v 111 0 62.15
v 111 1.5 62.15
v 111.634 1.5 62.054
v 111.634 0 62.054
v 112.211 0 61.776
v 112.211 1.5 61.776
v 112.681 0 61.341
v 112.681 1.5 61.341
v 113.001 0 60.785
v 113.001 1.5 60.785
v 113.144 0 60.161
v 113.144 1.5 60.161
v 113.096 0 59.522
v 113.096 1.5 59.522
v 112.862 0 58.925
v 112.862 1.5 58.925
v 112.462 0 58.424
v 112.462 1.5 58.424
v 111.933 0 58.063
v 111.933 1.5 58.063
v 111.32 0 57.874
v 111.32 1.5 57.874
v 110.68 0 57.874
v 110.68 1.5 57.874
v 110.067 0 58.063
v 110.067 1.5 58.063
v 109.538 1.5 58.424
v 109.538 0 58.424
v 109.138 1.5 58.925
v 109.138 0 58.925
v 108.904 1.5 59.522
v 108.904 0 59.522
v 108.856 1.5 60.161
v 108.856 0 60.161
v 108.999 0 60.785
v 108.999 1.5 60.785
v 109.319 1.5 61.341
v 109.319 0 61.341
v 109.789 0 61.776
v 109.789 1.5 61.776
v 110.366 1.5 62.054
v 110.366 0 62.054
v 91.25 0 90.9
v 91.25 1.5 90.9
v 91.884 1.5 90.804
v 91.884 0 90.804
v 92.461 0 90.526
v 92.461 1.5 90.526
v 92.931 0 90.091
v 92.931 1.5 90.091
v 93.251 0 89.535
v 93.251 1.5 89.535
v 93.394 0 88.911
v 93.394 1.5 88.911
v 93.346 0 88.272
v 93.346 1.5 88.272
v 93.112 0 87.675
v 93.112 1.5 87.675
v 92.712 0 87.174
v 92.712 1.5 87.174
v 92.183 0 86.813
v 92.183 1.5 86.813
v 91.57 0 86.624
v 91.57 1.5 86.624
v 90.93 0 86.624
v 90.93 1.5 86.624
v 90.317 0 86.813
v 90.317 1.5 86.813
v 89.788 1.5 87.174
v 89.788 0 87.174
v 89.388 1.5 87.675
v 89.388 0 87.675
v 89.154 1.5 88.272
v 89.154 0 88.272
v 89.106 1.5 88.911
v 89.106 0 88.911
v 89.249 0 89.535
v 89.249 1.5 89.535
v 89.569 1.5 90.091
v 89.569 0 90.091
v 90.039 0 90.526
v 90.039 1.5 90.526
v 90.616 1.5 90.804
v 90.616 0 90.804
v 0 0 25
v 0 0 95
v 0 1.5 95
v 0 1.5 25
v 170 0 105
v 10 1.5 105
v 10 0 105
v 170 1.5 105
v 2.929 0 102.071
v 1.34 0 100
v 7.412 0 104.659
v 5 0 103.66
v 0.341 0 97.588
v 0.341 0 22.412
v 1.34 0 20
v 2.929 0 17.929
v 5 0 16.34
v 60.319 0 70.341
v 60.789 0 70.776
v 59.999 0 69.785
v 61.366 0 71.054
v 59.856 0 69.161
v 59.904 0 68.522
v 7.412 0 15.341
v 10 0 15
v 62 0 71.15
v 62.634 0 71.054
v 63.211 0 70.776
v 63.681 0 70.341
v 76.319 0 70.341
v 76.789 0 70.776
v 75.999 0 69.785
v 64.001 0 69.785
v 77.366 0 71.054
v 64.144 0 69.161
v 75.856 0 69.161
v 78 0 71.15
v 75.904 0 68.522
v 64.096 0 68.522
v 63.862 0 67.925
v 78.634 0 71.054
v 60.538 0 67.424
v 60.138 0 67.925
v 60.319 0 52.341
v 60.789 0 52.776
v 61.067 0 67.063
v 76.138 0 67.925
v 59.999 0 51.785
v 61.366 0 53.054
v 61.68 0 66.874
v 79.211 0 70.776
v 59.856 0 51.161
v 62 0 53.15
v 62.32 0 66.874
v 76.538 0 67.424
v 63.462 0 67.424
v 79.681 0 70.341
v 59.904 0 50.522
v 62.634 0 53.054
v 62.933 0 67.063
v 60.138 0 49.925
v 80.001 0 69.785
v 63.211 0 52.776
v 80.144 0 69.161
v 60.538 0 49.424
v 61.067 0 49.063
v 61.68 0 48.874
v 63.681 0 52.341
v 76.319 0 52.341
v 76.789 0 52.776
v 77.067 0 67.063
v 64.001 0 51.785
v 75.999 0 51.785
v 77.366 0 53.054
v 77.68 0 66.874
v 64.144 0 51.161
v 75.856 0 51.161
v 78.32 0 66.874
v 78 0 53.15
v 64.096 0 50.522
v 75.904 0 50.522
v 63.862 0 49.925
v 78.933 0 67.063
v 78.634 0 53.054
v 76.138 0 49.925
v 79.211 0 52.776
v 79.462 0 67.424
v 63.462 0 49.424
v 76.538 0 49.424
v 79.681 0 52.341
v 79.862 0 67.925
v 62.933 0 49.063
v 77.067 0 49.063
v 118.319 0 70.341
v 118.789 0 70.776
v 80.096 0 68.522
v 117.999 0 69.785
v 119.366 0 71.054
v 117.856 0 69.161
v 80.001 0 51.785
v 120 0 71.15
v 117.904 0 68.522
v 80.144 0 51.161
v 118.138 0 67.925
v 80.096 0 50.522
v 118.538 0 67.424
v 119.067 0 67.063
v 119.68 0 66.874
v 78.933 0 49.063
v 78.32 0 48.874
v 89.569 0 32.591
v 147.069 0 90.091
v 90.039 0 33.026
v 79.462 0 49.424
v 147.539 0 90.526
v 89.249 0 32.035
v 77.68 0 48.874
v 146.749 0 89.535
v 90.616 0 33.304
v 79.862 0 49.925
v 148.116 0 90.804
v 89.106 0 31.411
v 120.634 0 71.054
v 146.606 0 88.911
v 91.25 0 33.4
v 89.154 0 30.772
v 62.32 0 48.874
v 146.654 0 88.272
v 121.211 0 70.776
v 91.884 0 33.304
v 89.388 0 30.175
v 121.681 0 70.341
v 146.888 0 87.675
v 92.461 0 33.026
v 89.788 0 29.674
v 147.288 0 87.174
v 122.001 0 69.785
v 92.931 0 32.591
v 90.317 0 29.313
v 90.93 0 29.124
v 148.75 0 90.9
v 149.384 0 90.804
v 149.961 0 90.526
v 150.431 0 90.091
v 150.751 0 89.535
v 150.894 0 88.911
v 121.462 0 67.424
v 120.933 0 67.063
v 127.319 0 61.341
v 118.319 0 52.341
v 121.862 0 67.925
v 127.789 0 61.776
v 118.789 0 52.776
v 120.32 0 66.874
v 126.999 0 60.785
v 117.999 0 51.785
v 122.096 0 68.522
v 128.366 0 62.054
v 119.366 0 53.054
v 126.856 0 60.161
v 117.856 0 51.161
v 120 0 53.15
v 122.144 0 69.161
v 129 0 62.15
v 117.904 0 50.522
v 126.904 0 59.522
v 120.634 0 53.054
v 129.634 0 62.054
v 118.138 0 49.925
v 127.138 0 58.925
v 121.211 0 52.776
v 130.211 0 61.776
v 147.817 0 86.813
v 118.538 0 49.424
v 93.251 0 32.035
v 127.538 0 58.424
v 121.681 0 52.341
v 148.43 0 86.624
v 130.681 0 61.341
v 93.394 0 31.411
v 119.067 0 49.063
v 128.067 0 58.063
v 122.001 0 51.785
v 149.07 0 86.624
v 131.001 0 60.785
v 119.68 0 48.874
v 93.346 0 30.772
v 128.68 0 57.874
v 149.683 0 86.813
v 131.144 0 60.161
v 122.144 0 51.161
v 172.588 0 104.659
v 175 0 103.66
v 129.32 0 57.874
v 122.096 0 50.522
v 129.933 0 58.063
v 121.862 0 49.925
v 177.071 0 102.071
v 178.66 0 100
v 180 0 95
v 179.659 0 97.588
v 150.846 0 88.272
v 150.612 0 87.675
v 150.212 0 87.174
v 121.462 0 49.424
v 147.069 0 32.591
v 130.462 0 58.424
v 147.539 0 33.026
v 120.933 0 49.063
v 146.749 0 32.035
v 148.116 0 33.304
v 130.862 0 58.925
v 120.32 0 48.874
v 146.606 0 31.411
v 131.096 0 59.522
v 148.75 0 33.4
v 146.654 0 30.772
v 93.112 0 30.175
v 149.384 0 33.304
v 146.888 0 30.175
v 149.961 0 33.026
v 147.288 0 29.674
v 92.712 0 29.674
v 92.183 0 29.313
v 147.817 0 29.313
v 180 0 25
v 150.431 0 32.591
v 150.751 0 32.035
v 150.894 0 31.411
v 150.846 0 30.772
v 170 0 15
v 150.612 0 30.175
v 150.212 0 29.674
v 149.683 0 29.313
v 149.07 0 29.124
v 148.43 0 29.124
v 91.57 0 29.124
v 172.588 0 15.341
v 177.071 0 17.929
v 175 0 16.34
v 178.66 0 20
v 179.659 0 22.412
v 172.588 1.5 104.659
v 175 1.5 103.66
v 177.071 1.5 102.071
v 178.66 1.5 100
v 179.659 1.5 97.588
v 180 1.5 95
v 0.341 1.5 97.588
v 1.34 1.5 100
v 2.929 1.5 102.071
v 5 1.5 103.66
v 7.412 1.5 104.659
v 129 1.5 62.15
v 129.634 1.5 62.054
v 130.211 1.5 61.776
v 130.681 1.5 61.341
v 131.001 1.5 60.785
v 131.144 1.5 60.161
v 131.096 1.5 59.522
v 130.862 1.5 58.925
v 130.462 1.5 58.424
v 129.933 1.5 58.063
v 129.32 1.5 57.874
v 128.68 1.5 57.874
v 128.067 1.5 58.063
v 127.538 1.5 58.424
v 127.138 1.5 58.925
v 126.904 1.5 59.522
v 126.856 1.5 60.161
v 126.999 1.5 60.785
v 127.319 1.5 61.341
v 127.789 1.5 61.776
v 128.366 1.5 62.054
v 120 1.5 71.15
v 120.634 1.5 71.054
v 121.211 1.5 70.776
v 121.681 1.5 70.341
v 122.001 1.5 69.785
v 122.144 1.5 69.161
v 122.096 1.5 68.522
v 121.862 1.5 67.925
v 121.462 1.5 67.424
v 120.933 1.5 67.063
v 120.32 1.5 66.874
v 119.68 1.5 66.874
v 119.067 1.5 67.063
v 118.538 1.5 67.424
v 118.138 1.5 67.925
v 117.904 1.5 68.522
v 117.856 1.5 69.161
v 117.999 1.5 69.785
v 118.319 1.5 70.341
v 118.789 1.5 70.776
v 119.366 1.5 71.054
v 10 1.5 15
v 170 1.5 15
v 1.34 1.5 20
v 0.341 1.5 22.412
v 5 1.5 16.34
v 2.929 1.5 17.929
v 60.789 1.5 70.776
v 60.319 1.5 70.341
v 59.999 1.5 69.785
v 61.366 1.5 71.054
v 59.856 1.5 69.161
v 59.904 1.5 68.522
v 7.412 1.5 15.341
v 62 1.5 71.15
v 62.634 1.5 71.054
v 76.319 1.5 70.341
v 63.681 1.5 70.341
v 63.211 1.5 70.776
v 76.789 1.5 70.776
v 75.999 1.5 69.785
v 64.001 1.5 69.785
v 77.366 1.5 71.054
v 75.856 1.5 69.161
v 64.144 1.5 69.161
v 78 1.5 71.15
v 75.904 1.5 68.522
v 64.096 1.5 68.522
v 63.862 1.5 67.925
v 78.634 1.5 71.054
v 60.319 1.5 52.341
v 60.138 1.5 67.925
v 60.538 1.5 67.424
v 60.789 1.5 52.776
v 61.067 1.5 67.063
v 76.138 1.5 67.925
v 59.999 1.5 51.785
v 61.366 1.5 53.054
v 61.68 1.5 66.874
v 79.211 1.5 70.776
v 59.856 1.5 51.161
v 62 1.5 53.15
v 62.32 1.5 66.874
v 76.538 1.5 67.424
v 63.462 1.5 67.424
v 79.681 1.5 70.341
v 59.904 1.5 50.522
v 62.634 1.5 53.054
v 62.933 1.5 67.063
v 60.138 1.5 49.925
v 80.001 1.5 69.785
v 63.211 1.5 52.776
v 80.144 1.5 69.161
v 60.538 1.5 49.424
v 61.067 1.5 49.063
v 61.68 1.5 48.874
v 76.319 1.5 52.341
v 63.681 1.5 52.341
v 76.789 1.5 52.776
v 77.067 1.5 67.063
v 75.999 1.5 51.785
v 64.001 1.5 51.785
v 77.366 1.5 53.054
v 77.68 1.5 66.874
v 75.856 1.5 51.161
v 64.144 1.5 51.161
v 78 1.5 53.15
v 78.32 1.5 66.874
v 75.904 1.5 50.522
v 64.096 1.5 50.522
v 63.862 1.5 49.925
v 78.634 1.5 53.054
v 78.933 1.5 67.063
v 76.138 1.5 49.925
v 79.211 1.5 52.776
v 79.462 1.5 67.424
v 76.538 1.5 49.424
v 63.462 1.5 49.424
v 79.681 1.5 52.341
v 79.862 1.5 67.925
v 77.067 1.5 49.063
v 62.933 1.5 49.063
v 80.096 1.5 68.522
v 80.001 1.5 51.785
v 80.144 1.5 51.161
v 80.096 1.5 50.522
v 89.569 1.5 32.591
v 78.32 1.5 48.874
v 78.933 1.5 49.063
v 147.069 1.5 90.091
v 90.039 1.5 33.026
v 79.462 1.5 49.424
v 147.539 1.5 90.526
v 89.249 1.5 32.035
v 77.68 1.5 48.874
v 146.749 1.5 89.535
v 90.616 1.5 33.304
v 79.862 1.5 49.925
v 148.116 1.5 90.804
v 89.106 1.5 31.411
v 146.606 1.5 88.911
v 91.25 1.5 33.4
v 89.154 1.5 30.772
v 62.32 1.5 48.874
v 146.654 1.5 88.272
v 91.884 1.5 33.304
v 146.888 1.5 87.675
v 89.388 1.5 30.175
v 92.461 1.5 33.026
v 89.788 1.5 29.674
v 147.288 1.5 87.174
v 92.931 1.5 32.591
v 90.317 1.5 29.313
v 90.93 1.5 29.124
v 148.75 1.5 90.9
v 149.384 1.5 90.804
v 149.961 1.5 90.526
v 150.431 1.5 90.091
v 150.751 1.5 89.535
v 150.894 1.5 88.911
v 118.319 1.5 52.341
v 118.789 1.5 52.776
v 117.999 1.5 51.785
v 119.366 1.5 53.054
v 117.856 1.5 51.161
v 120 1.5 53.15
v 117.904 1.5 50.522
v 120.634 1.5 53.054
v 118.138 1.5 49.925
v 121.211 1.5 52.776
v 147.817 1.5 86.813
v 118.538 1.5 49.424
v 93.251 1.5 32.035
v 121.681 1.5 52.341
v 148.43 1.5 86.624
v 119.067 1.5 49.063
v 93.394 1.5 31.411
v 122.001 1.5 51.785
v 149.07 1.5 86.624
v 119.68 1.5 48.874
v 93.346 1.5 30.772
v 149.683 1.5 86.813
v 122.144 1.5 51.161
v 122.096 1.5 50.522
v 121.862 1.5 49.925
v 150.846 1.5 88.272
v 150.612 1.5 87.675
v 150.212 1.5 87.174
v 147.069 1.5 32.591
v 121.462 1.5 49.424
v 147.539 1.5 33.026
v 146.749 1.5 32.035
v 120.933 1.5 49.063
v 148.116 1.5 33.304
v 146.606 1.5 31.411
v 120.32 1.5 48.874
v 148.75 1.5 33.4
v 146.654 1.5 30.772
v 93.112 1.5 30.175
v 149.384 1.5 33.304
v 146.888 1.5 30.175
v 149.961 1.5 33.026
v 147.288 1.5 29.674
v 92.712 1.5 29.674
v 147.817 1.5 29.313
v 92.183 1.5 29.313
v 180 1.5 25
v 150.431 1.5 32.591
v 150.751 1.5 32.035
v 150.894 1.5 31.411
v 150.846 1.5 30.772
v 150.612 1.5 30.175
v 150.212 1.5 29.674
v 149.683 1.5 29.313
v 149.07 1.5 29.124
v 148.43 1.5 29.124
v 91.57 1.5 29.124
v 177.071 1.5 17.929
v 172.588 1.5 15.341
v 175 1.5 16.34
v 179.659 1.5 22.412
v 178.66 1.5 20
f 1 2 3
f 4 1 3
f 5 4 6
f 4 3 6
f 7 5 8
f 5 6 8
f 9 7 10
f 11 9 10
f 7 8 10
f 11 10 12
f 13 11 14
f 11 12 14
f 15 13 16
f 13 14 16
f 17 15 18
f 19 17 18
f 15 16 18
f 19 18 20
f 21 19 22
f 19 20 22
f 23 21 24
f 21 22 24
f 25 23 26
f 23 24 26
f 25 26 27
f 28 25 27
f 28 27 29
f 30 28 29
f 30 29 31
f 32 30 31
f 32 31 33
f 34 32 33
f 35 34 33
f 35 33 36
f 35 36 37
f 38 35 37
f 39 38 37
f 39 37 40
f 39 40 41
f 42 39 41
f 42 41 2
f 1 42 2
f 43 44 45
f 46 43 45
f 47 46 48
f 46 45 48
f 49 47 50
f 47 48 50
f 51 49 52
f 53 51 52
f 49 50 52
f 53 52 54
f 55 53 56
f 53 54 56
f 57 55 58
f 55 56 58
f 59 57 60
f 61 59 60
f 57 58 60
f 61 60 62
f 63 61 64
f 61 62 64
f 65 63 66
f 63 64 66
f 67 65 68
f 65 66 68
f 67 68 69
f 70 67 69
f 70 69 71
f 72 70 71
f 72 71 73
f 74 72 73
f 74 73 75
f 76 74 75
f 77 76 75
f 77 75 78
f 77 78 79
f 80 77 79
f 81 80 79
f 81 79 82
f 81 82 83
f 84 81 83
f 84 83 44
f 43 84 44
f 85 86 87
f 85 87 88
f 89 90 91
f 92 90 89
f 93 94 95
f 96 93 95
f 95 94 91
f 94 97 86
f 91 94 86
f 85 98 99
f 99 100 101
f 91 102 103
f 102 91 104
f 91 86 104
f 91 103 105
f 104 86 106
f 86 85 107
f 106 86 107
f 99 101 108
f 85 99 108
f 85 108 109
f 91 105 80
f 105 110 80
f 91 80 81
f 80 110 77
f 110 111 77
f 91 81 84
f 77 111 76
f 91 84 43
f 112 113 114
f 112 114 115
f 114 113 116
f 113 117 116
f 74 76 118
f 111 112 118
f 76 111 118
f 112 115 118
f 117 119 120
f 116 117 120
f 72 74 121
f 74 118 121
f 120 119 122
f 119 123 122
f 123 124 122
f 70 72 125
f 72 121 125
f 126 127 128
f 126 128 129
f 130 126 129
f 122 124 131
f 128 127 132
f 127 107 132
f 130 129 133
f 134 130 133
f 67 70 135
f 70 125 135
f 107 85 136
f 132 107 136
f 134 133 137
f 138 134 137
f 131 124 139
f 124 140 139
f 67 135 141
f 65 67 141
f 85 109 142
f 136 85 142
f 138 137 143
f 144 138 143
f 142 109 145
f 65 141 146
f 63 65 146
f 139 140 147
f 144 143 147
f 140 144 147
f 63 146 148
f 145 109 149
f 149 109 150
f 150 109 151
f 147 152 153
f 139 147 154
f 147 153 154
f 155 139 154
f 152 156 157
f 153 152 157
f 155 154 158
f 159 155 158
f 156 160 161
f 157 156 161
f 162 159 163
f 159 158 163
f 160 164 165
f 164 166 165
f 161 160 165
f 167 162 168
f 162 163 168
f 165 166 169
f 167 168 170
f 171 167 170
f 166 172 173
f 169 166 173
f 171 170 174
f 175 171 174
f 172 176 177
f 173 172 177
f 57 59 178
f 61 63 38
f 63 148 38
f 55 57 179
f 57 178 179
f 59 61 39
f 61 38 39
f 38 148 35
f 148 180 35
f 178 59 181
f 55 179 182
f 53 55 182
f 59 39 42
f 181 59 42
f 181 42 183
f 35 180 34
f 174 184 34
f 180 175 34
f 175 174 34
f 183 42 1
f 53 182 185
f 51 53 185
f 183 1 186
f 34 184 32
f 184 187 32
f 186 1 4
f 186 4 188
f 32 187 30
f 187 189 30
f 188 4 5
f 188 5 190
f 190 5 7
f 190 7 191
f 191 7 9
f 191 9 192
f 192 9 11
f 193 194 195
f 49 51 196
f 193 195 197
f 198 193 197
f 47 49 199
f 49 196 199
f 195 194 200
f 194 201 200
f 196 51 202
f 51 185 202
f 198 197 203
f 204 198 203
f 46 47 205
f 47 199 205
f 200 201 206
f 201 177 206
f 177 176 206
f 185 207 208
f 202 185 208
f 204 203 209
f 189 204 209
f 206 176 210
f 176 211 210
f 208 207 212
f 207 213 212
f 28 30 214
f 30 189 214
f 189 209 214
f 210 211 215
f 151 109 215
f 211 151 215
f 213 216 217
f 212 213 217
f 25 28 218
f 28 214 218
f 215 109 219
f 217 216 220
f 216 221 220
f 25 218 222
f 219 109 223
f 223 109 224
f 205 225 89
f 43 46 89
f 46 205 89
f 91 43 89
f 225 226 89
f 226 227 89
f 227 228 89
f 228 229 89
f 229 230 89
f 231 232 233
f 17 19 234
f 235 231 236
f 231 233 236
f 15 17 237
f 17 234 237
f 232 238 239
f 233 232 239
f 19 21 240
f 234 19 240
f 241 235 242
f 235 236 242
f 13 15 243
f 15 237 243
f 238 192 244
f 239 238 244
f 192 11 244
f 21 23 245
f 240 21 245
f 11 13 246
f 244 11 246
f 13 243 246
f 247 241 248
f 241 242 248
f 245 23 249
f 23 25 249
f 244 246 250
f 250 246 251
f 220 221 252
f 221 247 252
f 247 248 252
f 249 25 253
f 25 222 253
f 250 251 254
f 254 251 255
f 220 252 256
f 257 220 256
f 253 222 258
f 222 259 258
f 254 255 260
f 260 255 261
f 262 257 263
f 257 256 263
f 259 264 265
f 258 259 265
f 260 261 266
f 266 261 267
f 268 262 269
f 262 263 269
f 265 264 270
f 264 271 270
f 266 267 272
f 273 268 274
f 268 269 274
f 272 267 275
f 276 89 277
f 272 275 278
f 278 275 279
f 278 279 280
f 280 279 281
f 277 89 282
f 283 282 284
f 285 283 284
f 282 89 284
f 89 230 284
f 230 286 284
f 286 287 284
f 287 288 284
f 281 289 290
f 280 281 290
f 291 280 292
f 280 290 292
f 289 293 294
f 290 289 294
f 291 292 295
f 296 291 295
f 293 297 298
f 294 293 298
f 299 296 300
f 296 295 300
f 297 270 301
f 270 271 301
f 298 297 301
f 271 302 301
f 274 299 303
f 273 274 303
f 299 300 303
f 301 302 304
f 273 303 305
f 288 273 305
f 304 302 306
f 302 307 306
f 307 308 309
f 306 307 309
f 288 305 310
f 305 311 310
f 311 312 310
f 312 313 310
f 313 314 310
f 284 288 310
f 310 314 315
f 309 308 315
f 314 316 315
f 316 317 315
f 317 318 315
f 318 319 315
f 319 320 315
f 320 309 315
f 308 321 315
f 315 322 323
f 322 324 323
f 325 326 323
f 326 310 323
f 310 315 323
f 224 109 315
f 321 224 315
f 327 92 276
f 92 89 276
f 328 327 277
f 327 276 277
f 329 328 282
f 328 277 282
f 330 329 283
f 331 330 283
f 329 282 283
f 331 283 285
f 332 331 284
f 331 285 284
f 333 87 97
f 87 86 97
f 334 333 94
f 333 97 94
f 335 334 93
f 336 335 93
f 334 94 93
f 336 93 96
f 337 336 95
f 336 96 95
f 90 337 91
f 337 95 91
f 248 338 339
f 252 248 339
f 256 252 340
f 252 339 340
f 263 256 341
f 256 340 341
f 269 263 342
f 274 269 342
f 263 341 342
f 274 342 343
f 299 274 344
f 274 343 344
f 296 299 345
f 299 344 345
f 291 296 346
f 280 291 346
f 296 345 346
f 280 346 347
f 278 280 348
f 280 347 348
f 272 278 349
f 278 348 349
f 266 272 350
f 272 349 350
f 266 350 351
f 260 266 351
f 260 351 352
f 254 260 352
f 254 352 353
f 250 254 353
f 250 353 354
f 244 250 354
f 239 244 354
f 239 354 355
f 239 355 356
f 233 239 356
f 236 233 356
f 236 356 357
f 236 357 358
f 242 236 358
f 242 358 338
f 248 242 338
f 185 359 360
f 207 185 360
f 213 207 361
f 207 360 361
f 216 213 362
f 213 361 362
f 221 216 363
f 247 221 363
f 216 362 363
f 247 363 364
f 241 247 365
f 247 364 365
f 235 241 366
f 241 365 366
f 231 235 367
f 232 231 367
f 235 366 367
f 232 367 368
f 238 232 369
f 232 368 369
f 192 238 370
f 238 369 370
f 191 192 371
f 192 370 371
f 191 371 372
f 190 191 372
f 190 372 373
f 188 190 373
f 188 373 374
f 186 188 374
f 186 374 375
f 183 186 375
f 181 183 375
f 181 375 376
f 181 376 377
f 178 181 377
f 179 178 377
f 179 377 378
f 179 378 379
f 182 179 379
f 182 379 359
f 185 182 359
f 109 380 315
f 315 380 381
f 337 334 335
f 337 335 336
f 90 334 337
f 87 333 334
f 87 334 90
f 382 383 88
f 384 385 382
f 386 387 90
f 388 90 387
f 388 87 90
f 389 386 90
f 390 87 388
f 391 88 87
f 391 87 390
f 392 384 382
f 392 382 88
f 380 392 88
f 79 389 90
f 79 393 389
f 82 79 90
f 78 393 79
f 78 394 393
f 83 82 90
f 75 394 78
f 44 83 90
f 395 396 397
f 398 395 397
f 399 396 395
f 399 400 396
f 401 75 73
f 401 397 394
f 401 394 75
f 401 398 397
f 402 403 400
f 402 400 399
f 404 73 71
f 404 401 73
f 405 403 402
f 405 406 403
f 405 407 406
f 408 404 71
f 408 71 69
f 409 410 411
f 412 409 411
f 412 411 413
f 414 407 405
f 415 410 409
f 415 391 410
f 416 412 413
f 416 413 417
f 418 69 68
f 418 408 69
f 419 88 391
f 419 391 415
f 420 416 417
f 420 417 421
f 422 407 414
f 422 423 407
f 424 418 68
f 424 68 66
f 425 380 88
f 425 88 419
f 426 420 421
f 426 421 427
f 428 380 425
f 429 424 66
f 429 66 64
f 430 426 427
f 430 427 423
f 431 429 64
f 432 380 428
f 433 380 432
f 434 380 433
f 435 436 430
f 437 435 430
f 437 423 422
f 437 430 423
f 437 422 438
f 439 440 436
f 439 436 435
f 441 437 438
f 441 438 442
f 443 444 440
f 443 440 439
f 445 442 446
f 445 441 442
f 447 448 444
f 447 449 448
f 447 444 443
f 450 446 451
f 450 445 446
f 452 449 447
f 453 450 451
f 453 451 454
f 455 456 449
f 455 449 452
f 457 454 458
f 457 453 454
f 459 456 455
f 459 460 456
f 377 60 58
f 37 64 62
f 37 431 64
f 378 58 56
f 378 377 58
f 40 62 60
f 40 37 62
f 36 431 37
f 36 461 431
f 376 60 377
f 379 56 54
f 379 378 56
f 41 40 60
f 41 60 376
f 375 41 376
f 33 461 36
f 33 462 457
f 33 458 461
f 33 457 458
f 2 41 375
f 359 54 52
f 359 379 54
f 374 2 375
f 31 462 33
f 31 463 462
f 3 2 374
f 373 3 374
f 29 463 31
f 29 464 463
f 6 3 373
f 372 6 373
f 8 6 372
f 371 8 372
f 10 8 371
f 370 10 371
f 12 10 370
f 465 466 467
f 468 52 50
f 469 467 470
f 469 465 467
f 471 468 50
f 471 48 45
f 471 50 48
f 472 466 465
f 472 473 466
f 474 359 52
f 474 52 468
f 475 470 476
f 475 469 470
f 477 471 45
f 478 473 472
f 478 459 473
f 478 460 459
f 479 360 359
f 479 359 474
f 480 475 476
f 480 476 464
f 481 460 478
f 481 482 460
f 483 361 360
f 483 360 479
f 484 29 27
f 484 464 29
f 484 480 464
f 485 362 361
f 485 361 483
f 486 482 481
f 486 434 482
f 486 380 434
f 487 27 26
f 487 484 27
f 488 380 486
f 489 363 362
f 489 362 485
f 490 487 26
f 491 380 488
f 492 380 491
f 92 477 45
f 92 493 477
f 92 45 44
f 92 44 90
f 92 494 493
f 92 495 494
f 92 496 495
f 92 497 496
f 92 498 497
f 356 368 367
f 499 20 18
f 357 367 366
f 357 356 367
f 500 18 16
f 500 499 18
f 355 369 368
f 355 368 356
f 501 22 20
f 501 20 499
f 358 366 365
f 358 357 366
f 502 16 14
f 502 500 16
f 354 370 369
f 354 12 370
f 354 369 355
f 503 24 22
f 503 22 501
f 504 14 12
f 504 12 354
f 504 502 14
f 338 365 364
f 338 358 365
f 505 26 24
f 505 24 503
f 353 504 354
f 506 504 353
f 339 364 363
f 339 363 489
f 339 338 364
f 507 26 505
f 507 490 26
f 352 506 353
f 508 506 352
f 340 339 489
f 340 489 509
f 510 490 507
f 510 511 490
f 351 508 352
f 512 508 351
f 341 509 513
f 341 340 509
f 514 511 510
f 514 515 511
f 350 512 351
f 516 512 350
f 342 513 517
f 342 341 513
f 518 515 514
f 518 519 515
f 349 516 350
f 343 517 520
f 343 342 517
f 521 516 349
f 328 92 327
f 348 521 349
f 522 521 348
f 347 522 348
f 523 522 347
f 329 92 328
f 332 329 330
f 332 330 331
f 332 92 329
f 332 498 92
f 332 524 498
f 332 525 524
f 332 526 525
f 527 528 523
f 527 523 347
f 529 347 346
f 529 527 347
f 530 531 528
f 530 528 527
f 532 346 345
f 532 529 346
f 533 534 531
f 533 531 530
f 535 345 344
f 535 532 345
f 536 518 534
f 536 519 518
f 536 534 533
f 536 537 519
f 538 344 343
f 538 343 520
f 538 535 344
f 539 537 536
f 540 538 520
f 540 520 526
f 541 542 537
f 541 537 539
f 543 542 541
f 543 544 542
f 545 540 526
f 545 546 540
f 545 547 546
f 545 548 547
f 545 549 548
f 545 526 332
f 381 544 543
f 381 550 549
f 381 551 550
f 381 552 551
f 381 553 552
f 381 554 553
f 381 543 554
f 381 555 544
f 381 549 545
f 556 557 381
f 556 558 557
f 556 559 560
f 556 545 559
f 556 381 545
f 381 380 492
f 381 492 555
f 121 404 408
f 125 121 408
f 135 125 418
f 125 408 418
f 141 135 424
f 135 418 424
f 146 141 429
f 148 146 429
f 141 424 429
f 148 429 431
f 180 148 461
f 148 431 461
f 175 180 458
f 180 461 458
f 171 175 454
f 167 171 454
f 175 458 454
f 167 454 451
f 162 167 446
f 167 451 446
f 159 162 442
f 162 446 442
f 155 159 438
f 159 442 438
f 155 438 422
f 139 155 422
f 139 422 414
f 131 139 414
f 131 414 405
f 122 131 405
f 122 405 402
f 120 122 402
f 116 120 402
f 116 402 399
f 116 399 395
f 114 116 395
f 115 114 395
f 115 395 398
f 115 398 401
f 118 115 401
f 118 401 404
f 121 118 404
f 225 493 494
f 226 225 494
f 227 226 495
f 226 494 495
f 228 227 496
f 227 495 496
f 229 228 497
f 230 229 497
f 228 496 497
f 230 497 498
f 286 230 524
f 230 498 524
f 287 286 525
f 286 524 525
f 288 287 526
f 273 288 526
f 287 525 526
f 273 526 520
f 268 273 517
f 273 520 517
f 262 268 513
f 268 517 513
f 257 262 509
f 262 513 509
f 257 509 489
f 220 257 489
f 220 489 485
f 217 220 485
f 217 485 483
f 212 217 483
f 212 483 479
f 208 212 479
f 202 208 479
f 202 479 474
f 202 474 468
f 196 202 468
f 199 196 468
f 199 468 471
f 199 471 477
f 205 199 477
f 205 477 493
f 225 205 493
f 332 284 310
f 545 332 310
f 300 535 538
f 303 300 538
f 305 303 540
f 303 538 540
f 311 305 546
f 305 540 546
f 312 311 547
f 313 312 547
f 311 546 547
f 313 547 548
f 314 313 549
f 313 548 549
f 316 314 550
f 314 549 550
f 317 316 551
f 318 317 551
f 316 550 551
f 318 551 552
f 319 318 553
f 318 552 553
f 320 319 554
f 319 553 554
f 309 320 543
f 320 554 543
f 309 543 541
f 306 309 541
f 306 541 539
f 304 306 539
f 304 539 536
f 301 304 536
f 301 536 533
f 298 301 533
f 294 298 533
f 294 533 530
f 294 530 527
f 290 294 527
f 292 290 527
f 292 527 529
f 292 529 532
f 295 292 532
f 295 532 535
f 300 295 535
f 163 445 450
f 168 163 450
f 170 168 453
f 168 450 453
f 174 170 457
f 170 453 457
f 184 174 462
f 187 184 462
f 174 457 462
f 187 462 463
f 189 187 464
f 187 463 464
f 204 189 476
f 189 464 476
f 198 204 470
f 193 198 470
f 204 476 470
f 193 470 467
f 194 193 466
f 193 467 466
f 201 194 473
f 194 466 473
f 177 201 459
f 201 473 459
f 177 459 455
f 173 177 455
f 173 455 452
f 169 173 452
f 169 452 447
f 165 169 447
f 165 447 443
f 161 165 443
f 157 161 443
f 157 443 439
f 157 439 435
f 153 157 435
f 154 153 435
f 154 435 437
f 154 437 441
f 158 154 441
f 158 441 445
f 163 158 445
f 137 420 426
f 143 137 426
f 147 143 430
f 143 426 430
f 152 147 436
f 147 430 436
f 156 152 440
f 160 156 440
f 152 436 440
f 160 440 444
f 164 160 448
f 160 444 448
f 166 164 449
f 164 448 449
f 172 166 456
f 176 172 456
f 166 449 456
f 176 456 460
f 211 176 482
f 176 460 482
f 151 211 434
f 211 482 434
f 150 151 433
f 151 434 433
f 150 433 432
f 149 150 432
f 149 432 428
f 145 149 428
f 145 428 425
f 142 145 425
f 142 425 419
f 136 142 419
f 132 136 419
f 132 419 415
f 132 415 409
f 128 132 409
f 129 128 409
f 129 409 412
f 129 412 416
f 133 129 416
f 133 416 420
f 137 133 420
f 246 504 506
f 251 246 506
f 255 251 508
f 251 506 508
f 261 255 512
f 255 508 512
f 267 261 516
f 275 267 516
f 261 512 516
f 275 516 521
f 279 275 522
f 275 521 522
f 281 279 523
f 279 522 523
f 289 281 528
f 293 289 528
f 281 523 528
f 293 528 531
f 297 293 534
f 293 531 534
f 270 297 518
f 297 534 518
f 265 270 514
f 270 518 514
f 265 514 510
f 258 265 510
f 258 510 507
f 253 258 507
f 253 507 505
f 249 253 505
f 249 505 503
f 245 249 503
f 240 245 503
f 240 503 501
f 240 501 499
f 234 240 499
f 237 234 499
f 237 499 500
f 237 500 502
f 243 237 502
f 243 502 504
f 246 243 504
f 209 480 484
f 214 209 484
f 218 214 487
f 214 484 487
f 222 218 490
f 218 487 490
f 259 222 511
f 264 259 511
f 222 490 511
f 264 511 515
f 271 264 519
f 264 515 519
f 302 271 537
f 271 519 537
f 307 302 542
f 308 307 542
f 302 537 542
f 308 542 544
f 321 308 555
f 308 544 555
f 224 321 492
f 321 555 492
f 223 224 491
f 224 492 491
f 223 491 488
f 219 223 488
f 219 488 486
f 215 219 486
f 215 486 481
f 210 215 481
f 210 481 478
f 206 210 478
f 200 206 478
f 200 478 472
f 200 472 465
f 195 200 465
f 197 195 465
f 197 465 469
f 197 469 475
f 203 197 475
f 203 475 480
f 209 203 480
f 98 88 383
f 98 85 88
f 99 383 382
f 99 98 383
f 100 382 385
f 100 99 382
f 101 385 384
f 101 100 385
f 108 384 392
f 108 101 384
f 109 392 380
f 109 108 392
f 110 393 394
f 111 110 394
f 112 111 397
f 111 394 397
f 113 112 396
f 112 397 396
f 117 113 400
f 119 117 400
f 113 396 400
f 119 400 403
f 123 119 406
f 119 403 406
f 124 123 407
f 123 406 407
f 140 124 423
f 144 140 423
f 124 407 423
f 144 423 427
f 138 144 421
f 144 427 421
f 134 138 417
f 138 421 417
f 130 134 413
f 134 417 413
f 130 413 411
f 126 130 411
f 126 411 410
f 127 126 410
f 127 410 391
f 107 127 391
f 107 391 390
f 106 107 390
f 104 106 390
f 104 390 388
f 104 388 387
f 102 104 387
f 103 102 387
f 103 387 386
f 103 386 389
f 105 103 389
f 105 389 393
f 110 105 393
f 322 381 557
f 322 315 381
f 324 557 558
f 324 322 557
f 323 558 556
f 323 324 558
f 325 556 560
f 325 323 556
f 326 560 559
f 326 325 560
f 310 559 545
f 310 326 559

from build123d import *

# Parameters (mm, degrees)
SKETCH1_W           = 180
SKETCH1_H           = 120
BOSS_EXTRUDE1_DEPTH = 1.5
SKETCH2_R           = 2.15
CUT_EXTRUDE1_DEPTH  = 217.33827678
SKETCH3_W           = 180
SKETCH3_H           = 15
CUT_EXTRUDE2_DEPTH  = 217.33827678
FILLET1_R           = 10


with BuildPart() as part:
    # Sketch1 → Boss-Extrude1 (new body)
    with BuildSketch(Plane(origin=(0, 0, 0), x_dir=(1, 0, 0), z_dir=(0, 1, 0))):
        with Locations((90, -60)):
            Rectangle(SKETCH1_W, SKETCH1_H)
    extrude(amount=BOSS_EXTRUDE1_DEPTH)

    # Sketch2 → Cut-Extrude1 (cut, through all)
    with BuildSketch(Plane(origin=(0, 1.5, 0), x_dir=(1, 0, 0), z_dir=(0, 1, 0))):
        with Locations(Location((120, -51, 0), (0, 0, 270))):
            Circle(SKETCH2_R)
        with Locations(Location((120, -69, 0), (0, 0, 270))):
            Circle(SKETCH2_R)
        with Locations(Location((129, -60, 0), (0, 0, 270))):
            Circle(SKETCH2_R)
        with Locations(Location((111, -60, 0), (0, 0, 270))):
            Circle(SKETCH2_R)
        with Locations(Location((78, -51, 0), (0, 0, 270))):
            Circle(SKETCH2_R)
        with Locations(Location((62, -51, 0), (0, 0, 270))):
            Circle(SKETCH2_R)
        with Locations(Location((62, -69, 0), (0, 0, 270))):
            Circle(SKETCH2_R)
        with Locations(Location((78, -69, 0), (0, 0, 270))):
            Circle(SKETCH2_R)
        with Locations(Location((148.75, -31.25, 0), (0, 0, 270))):
            Circle(SKETCH2_R)
        with Locations(Location((91.25, -31.25, 0), (0, 0, 270))):
            Circle(SKETCH2_R)
        with Locations(Location((91.25, -88.75, 0), (0, 0, 270))):
            Circle(SKETCH2_R)
        with Locations(Location((148.75, -88.75, 0), (0, 0, 270))):
            Circle(SKETCH2_R)
    extrude(amount=-CUT_EXTRUDE1_DEPTH, mode=Mode.SUBTRACT)

    # Sketch3 → Cut-Extrude2 (cut, through all)
    with BuildSketch(Plane(origin=(0, 1.5, 0), x_dir=(1, 0, 0), z_dir=(0, 1, 0))):
        with Locations((90, -7.5)):
            Rectangle(SKETCH3_W, SKETCH3_H)
        with Locations((90, -112.5)):
            Rectangle(SKETCH3_W, SKETCH3_H)
    extrude(amount=-CUT_EXTRUDE2_DEPTH, mode=Mode.SUBTRACT)

    # Fillet1
    fillet1_edges = [part.edges().sort_by_distance(p)[0] for p in [
        (0, 0.75, 15),
        (180, 0.75, 15),
        (0, 0.75, 105),
        (180, 0.75, 105),
    ]]
    fillet(fillet1_edges, radius=FILLET1_R)


solid = part.part
